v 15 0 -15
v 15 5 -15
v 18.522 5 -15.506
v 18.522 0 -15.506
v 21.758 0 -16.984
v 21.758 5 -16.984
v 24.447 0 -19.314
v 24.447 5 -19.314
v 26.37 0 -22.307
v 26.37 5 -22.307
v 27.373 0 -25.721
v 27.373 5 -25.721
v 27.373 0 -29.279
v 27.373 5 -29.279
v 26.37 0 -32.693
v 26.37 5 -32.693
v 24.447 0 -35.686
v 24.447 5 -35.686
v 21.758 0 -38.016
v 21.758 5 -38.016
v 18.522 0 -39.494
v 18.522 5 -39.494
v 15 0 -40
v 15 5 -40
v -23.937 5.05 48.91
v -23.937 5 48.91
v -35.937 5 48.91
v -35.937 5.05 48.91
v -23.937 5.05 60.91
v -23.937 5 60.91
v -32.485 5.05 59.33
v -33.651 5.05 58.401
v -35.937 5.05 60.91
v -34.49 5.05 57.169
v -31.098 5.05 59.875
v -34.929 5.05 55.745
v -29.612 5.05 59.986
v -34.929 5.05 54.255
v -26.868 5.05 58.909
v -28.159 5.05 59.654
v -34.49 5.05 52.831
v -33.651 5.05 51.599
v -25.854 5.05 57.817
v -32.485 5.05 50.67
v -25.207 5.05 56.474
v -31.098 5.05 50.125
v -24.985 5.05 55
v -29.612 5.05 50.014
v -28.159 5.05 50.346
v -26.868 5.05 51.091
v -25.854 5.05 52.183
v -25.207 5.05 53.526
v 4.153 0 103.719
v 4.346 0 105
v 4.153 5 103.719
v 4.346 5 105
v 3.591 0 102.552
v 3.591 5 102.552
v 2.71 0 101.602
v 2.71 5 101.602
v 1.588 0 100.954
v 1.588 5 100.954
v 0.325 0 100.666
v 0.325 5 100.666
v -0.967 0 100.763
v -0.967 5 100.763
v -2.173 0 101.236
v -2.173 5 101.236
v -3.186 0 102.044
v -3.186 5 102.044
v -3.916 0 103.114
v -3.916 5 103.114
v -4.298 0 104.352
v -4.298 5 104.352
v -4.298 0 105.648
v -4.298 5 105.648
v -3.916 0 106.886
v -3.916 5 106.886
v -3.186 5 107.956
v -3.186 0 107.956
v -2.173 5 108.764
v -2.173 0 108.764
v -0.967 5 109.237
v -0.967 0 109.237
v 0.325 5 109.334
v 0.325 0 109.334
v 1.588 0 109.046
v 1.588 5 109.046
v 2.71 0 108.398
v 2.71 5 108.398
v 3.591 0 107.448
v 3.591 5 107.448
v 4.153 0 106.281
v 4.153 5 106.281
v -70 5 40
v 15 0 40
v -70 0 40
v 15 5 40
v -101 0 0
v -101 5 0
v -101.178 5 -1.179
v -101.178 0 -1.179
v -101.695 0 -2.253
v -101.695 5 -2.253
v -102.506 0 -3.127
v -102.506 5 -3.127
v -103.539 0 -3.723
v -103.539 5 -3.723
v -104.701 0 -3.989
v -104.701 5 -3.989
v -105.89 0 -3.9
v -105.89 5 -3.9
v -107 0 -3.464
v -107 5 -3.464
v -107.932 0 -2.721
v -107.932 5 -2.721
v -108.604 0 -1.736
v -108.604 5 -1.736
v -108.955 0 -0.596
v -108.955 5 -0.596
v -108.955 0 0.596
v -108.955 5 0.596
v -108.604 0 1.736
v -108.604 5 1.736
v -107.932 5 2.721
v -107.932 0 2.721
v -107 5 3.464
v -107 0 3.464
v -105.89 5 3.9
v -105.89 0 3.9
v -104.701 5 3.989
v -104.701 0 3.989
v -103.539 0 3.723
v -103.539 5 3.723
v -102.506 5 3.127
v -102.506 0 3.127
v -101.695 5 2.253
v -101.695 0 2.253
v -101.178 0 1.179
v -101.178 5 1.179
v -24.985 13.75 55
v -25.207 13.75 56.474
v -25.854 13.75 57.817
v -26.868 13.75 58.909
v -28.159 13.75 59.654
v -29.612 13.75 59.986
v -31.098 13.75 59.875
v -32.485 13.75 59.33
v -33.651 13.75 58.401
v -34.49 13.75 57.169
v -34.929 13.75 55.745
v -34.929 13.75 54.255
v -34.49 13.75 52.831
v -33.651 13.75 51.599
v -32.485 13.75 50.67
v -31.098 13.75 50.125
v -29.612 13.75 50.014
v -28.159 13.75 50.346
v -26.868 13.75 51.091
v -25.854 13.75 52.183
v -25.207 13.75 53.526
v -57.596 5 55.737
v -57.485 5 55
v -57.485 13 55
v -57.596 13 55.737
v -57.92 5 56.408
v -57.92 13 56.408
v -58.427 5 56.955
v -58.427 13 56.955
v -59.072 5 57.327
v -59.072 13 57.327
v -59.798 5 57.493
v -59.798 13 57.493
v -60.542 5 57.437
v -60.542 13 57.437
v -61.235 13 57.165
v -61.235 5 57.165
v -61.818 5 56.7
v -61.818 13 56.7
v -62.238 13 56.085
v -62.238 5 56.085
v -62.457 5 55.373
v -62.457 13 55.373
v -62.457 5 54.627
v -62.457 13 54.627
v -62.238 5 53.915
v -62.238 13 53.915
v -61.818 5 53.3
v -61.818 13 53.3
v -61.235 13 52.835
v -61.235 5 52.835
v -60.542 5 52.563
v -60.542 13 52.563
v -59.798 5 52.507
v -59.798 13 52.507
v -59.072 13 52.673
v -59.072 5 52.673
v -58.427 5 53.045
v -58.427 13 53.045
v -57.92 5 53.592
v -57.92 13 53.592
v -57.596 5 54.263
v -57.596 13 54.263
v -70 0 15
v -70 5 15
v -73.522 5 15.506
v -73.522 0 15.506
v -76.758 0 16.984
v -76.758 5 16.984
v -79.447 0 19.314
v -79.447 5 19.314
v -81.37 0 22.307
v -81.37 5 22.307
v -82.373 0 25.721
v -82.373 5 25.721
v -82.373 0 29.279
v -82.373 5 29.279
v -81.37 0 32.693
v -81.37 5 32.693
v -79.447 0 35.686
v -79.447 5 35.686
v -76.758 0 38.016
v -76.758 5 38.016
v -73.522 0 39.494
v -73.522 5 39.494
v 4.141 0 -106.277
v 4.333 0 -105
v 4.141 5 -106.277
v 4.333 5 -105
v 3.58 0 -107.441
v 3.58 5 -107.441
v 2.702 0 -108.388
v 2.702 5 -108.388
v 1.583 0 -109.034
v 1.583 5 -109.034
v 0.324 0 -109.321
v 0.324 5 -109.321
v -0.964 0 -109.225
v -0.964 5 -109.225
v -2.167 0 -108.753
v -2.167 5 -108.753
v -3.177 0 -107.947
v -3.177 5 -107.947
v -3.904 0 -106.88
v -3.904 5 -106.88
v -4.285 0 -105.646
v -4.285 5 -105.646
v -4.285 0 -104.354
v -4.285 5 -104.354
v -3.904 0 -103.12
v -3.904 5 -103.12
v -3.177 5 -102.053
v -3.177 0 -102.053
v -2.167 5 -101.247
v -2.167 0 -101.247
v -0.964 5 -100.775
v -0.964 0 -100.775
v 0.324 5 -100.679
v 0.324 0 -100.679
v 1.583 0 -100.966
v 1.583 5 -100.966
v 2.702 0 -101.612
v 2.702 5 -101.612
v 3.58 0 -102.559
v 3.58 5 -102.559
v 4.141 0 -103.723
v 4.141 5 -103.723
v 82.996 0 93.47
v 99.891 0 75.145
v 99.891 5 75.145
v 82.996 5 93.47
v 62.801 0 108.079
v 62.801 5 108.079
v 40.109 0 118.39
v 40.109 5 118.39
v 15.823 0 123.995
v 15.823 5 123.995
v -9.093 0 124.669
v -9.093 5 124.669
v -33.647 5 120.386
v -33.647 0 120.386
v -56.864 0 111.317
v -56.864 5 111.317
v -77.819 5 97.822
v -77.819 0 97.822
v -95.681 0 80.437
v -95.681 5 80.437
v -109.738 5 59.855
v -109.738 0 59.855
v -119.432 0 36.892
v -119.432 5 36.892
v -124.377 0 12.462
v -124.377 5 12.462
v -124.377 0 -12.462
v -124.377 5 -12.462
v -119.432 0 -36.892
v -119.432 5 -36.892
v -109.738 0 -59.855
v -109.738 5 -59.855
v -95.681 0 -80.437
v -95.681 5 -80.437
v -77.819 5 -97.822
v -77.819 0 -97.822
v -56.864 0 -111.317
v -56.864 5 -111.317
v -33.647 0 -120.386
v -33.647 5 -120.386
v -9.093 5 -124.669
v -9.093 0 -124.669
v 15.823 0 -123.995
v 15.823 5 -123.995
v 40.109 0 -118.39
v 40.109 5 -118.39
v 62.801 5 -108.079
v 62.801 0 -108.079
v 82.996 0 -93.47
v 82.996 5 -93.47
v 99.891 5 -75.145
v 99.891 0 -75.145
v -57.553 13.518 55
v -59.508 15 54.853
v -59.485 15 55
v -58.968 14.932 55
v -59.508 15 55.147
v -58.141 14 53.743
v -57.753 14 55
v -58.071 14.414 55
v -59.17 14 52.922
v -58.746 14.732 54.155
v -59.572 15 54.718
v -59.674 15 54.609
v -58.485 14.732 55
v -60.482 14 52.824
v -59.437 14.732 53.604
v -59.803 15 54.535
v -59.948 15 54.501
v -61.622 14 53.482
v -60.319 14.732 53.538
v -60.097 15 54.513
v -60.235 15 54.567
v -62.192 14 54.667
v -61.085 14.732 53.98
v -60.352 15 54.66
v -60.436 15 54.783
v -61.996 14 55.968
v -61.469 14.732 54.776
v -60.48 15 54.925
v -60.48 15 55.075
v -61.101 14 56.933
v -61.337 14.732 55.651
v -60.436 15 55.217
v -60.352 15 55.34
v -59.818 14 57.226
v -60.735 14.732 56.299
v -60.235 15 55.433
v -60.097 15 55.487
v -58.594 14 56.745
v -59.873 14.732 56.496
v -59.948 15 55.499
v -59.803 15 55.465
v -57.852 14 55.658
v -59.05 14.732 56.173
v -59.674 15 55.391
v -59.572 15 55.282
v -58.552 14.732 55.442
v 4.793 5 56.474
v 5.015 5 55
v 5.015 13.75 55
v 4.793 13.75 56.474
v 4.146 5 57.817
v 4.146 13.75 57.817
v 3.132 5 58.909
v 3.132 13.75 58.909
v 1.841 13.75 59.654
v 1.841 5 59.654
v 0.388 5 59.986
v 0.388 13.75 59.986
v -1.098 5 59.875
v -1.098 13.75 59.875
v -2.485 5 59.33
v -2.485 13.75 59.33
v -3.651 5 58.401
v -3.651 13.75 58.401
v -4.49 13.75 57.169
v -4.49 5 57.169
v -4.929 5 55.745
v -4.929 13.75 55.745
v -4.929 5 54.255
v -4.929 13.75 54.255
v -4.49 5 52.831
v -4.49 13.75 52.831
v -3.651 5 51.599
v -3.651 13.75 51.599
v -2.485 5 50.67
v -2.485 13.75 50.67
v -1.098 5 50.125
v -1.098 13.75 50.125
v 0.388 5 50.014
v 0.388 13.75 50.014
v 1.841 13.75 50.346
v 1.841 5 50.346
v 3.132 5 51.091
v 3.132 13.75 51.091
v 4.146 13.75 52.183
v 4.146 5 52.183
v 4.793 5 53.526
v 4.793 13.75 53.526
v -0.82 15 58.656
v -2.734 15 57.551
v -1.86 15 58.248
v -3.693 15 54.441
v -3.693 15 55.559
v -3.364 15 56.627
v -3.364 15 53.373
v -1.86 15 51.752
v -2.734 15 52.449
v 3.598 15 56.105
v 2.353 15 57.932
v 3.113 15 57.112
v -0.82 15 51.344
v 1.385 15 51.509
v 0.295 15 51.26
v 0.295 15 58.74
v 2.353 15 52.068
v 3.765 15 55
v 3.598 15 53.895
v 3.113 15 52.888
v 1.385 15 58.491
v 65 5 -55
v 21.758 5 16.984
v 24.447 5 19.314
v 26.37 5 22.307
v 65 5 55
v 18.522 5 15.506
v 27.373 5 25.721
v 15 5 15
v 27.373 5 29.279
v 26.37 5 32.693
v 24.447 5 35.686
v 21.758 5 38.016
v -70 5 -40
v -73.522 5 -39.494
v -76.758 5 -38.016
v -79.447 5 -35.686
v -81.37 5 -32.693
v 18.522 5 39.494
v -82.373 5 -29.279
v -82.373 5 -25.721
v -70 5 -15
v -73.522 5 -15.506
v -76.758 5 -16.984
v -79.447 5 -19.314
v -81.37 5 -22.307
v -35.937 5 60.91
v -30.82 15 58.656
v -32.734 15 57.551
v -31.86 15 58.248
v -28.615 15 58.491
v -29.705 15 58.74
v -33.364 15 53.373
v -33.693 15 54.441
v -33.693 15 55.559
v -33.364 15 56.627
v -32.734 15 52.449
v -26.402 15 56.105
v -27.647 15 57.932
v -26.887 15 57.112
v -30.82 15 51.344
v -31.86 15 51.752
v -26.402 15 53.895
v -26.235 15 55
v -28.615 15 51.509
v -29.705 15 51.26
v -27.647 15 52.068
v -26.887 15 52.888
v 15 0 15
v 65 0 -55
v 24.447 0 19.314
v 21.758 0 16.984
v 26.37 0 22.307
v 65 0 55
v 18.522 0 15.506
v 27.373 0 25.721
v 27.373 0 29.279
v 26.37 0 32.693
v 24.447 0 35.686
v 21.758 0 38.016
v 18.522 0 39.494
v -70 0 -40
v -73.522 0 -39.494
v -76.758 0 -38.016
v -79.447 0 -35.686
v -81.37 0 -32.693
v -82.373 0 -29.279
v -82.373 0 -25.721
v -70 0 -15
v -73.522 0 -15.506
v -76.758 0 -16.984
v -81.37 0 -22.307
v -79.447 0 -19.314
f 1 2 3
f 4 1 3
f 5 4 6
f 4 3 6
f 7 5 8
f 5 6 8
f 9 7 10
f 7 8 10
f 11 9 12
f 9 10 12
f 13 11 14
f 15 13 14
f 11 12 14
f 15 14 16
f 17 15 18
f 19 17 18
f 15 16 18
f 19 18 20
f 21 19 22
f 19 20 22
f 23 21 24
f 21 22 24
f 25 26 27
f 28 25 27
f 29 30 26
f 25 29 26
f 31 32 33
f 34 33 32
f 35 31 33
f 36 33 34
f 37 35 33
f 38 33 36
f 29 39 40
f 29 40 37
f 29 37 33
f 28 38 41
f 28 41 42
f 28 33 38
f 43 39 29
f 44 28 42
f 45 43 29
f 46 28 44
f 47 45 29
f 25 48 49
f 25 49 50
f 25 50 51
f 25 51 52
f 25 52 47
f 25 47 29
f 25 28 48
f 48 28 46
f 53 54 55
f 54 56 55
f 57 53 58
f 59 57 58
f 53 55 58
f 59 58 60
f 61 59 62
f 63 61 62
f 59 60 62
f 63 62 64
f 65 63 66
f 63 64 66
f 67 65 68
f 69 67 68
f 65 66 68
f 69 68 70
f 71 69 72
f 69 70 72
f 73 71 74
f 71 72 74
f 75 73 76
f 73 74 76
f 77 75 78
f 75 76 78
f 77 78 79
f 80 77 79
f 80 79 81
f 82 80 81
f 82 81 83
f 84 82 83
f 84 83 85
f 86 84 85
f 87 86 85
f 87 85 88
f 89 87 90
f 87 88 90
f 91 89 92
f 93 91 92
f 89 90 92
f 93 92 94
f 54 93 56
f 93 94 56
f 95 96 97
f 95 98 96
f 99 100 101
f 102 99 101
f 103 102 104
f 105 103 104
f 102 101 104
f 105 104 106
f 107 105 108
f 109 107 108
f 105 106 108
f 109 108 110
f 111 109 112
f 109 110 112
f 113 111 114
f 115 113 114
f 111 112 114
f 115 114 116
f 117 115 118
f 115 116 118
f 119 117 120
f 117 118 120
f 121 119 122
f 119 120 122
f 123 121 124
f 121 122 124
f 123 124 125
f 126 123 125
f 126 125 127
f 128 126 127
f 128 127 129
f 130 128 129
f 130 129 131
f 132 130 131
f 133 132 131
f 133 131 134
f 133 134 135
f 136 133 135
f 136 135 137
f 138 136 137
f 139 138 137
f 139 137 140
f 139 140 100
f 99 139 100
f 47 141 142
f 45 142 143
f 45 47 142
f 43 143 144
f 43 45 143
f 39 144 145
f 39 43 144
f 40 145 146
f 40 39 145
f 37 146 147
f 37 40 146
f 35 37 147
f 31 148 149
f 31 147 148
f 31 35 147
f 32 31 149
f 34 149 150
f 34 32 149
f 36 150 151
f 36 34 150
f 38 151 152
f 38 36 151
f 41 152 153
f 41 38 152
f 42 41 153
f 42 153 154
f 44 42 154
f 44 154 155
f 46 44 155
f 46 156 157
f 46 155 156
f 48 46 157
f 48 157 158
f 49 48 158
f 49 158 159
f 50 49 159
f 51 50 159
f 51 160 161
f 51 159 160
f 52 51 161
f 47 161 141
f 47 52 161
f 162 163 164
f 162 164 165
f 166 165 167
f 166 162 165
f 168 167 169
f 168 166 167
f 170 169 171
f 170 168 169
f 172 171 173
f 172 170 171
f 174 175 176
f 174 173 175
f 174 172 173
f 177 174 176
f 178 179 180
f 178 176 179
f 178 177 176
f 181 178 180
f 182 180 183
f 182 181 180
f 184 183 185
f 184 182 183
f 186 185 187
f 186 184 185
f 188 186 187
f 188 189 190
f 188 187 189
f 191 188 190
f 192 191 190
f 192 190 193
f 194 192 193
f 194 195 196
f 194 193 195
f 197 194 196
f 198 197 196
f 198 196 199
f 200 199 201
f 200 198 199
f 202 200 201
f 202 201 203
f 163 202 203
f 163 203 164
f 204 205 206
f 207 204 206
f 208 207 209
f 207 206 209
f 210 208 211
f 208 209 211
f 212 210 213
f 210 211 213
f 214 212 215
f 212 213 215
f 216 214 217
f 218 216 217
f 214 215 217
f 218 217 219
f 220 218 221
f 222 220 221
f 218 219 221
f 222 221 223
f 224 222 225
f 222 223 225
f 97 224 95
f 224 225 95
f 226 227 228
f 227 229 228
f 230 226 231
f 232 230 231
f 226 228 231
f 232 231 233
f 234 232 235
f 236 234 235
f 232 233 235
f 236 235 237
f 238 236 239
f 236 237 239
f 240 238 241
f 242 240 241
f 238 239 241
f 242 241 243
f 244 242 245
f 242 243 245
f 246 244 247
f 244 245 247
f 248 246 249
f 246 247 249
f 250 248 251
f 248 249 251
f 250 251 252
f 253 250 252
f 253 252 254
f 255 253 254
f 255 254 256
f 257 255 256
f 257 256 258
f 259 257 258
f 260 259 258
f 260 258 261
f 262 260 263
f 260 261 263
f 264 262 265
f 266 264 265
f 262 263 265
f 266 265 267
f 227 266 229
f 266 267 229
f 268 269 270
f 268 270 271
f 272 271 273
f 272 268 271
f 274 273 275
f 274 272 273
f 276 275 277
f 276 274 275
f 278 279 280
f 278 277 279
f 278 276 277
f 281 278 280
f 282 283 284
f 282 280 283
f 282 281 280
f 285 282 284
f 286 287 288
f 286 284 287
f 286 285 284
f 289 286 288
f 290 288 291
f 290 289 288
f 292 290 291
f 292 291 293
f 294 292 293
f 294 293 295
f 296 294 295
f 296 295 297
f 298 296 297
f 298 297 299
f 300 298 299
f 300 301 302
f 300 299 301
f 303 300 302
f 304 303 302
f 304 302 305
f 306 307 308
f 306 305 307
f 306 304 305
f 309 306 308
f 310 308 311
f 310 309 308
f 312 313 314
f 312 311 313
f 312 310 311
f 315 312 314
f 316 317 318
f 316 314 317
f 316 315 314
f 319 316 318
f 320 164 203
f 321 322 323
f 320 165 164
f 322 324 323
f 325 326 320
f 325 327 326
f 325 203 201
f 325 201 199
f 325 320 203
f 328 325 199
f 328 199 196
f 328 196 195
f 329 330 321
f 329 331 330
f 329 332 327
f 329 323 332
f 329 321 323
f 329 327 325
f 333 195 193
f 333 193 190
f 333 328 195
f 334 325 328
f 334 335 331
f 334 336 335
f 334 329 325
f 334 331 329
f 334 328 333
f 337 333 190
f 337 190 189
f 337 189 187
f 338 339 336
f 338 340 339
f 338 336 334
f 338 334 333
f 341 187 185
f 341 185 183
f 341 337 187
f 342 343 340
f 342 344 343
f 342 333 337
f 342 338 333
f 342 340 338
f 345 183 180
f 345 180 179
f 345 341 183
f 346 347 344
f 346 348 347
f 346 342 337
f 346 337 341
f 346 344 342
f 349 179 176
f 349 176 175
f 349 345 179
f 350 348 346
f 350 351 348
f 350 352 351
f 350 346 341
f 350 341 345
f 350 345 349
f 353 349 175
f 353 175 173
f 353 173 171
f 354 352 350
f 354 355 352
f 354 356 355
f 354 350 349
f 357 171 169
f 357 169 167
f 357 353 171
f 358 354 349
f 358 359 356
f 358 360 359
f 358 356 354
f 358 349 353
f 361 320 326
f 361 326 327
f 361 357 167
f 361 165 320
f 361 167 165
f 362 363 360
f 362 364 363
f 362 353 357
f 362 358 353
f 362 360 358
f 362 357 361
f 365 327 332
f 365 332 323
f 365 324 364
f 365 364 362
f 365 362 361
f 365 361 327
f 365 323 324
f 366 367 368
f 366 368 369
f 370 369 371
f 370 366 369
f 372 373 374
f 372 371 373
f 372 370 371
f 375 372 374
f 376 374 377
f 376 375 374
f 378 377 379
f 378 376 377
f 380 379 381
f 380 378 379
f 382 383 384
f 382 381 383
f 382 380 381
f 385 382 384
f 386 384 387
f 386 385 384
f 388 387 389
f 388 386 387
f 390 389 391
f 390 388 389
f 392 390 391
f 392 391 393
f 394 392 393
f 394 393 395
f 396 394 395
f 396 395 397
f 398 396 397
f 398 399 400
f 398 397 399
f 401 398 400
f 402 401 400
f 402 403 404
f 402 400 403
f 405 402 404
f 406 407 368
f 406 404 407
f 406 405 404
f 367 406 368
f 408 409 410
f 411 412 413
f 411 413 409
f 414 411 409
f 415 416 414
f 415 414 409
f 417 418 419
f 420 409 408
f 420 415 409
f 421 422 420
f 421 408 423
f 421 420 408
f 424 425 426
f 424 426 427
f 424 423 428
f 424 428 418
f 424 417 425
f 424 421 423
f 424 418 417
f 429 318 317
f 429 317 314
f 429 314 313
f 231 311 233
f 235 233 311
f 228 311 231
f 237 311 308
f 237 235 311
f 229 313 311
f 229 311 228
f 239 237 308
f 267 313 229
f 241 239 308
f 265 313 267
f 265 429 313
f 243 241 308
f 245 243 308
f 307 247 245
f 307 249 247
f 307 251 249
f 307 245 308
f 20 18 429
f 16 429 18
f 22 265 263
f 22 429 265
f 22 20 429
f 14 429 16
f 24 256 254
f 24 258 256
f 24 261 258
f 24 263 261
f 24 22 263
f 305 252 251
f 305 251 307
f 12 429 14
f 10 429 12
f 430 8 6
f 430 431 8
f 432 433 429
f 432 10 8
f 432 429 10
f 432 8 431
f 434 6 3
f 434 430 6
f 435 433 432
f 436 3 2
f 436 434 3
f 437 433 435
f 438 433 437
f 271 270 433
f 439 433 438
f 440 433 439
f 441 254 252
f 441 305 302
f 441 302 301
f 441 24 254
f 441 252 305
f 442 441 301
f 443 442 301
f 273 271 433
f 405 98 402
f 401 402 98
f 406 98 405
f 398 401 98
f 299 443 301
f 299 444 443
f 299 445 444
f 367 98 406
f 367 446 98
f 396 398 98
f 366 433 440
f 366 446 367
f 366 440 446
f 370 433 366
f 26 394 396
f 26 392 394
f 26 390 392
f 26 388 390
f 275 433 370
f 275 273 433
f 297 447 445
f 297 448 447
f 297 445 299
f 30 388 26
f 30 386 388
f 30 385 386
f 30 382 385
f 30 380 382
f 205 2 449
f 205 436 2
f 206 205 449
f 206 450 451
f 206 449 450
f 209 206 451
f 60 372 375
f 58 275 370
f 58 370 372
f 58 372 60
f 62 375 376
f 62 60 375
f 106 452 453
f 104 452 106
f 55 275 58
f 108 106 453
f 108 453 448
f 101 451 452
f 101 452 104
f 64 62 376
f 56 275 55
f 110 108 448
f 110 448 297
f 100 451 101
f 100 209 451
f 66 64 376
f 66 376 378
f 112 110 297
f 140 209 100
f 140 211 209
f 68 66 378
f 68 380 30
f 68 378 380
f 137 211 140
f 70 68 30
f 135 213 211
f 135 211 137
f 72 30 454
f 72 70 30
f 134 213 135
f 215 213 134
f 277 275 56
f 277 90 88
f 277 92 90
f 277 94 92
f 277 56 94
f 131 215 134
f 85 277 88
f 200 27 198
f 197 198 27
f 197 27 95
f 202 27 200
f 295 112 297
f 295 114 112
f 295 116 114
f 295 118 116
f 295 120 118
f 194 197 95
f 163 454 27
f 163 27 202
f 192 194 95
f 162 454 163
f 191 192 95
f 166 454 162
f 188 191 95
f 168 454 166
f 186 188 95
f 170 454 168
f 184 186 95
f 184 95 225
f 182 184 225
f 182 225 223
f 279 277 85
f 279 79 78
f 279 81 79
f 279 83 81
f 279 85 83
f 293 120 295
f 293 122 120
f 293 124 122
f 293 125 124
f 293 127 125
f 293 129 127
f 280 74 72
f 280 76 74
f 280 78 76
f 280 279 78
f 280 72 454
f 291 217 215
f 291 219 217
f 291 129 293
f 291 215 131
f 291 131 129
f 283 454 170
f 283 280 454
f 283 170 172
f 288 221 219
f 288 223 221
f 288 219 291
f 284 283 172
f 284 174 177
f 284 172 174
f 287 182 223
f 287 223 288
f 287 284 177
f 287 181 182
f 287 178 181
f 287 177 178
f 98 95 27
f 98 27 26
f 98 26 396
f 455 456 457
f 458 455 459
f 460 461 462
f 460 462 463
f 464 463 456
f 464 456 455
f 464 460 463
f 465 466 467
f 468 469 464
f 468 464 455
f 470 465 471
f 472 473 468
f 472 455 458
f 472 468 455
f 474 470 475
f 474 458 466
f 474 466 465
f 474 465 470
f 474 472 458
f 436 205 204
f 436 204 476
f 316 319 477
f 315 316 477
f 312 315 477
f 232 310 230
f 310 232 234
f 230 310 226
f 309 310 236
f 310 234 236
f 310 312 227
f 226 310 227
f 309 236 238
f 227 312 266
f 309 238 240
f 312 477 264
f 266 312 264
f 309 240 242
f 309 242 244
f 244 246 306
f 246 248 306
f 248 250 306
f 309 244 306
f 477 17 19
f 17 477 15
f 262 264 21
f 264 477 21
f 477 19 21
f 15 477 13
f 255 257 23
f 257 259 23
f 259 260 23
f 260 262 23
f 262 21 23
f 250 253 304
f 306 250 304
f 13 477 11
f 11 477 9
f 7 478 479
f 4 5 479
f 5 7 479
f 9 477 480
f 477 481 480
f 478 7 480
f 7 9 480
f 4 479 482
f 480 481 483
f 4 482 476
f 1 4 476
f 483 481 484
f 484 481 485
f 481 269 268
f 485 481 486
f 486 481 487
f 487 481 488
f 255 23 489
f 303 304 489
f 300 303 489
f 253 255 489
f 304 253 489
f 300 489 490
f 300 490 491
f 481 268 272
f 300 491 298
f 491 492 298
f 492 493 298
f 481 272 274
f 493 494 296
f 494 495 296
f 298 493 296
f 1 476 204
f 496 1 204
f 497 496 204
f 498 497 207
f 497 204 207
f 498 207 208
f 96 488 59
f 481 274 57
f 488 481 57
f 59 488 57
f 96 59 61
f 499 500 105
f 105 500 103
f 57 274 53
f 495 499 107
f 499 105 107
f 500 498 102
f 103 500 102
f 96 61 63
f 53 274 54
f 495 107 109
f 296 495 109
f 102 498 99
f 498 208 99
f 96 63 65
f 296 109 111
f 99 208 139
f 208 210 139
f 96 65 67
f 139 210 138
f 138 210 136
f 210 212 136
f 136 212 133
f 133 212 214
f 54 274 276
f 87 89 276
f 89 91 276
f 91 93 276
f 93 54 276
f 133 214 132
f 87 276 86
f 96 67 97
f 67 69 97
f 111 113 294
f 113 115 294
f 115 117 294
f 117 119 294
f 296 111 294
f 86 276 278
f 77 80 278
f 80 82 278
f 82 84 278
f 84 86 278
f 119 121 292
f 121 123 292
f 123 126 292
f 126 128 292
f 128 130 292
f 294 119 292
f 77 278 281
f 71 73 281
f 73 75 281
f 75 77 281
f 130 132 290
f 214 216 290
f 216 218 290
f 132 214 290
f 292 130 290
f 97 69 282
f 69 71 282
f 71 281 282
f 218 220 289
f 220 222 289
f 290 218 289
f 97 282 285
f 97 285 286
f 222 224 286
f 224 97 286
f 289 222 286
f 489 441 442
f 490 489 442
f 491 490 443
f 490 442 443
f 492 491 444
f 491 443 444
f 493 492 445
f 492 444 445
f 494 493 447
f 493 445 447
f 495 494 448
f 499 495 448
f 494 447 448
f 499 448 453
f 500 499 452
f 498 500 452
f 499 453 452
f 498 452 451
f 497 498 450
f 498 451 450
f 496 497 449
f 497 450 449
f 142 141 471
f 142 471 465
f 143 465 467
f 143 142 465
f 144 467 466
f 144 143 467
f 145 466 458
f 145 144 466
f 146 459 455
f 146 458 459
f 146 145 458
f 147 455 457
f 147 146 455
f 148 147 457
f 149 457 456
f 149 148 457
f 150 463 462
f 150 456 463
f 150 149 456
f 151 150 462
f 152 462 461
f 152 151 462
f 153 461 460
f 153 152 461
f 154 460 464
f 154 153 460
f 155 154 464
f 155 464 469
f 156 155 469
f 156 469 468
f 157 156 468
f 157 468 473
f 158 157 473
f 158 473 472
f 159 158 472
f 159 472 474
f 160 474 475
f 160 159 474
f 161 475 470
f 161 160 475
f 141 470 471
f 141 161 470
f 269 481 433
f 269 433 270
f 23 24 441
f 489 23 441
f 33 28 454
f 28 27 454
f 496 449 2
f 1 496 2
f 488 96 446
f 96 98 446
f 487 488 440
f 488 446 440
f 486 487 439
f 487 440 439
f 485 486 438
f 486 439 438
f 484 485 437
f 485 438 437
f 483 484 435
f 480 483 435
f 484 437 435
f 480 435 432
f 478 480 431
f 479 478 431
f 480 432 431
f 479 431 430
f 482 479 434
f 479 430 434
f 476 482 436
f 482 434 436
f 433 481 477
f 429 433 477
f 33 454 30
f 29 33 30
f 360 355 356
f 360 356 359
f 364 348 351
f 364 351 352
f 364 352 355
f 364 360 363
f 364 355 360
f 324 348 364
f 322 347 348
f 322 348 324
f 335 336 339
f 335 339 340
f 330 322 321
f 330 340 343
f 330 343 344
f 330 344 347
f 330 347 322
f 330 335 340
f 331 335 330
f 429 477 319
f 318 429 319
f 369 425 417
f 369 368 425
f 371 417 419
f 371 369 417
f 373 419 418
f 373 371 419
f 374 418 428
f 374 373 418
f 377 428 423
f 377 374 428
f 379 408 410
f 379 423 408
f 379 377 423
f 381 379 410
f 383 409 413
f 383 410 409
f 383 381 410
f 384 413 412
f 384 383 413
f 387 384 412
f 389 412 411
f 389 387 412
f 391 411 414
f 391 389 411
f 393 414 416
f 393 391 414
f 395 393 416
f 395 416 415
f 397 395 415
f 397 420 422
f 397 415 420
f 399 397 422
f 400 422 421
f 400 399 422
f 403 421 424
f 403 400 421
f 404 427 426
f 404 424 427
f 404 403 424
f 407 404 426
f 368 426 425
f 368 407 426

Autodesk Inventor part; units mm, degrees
ref_plane "YZ Plane" through (0, 0, 0) normal (1, 0, 0) x (0, 1, 0)
ref_plane "XZ Plane" through (0, 0, 0) normal (0, 1, 0) x (-1, 0, 0)
ref_plane "XY Plane" through (0, 0, 0) normal (0, 0, 1) x (1, 0, 0)
sketch "Sketch1" plane through (0, 0, 0) normal (0, 1, 0) x (-1, 0, 0)
  arc A0 (-99.8914, -75.1446) -> (-99.8914, 75.1446) centre (0, 0) ccw
  line L0 (-65, 0) -> (-65, 55)
  line L1 (-65, 55) -> (-99.8914, 75.1446)
  line L2 (-65, 0) -> (-65, -55)
  line L3 (-65, -55) -> (-99.8914, -75.1446)
  dimension "d0" = 250
  dimension "d4" = 55
  dimension "d6" = 120
extrude "Extrusion1" add sketch "Sketch1" along normal blind 5
sketch "Sketch2" plane through (0, 5, 0) normal (0, 1, 0) x (1, 0, 0)
  line L0 (-70, 15) -> (15, 15)
  line L1 (15, 40) -> (-70, 40)
  arc A0 (15, 15) -> (15, 40) centre (15, 27.5) ccw
  arc A1 (-70, 40) -> (-70, 15) centre (-70, 27.5) ccw
  line L2 (65, -55) -> (65, 55) projected
  line L3 (-70, -15) -> (15, -15)
  line L4 (15, -40) -> (-70, -40)
  arc A2 (15, -40) -> (15, -15) centre (15, -27.5) ccw
  arc A3 (-70, -15) -> (-70, -40) centre (-70, -27.5) ccw
  point P0 (0, 0)
extrude "Extrusion2" cut sketch "Sketch2" against normal blind 10
sketch "Sketch3" plane through (0, 5, 0) normal (0, 1, 0) x (1, 0, 0)
  circle A0 centre (-105, 0) radius 4
  circle A1 centre (0, 105) radius 4.3333
  circle A2 centre (0, -105) radius 4.3461
  arc A3 (99.8914, 75.1446) -> (99.8914, -75.1446) centre (0, 0) ccw projected
  dimension "d25" = 8
  dimension "d26" = 105
  dimension "d27" = 105
  dimension "d28" = 105
extrude "Extrusion3" cut sketch "Sketch3" against normal blind 10
sketch "Sketch4" plane through (0, 5, 0) normal (0, 1, 0) x (1, 0, 0)
  circle A0 centre (-59.9853, -55) radius 2.5
  circle A1 centre (-29.9853, -55) radius 5
  circle A2 centre (0.0147, -55) radius 5
  line L0 (-104.2134, 0) -> (86.9491, 0)
  point P0 (0, 0)
  dimension "d31" = 5
  dimension "d32" = 10
  dimension "d33" = 10
  dimension "d34" = 55
  dimension "d35" = 55
  dimension "d36" = 55
  dimension "d37" = 30
  dimension "d38" = 30
extrude "Extrusion4" add sketch "Sketch4" along normal blind 10
fillet "Fillet2" radius 2 1 edges at (-62.4853, 15, 55)
chamfer "Chamfer1" distance 1.25 angle 45 1 edges at (-4.9853, 15, 55)
chamfer "Chamfer2" distance 1.25 angle 45 1 edges at (-34.9853, 15, 55)
sketch "Sketch5" plane through (0, 5, 0) normal (0, 1, 0) x (1, 0, 0)
  line L0 (-35.937, -60.9099) -> (-23.937, -60.9099)
  line L1 (-23.937, -60.9099) -> (-23.937, -48.9099)
  line L2 (-23.937, -48.9099) -> (-35.937, -48.9099)
  line L3 (-35.937, -48.9099) -> (-35.937, -60.9099)
  point P0 (0, 0)
  point P1 (-29.437, -54.7059)
  point P2 (-29.437, -54.7059)
  dimension "d50" = 12
  dimension "d51" = 12
  dimension "d52" = 6.5
  dimension "d53" = 5.796
extrude "Extrusion5" add sketch "Sketch5" along normal blind 0.05
sketch "Sketch6" plane through (0, 5, 0) normal (0, 1, 0) x (1, 0, 0)
  line L0 (-36.7143, -61.9407) -> (-23.1511, -61.9407) construction
  line L1 (-23.1511, -61.9407) -> (-23.1511, -65.2373) construction
  line L2 (-23.1511, -65.2373) -> (-36.7143, -65.2373) construction
  line L3 (-36.7143, -65.2373) -> (-36.7143, -61.9407) construction
  point P0 (0, 0)
properties part number "Top and middle round"
